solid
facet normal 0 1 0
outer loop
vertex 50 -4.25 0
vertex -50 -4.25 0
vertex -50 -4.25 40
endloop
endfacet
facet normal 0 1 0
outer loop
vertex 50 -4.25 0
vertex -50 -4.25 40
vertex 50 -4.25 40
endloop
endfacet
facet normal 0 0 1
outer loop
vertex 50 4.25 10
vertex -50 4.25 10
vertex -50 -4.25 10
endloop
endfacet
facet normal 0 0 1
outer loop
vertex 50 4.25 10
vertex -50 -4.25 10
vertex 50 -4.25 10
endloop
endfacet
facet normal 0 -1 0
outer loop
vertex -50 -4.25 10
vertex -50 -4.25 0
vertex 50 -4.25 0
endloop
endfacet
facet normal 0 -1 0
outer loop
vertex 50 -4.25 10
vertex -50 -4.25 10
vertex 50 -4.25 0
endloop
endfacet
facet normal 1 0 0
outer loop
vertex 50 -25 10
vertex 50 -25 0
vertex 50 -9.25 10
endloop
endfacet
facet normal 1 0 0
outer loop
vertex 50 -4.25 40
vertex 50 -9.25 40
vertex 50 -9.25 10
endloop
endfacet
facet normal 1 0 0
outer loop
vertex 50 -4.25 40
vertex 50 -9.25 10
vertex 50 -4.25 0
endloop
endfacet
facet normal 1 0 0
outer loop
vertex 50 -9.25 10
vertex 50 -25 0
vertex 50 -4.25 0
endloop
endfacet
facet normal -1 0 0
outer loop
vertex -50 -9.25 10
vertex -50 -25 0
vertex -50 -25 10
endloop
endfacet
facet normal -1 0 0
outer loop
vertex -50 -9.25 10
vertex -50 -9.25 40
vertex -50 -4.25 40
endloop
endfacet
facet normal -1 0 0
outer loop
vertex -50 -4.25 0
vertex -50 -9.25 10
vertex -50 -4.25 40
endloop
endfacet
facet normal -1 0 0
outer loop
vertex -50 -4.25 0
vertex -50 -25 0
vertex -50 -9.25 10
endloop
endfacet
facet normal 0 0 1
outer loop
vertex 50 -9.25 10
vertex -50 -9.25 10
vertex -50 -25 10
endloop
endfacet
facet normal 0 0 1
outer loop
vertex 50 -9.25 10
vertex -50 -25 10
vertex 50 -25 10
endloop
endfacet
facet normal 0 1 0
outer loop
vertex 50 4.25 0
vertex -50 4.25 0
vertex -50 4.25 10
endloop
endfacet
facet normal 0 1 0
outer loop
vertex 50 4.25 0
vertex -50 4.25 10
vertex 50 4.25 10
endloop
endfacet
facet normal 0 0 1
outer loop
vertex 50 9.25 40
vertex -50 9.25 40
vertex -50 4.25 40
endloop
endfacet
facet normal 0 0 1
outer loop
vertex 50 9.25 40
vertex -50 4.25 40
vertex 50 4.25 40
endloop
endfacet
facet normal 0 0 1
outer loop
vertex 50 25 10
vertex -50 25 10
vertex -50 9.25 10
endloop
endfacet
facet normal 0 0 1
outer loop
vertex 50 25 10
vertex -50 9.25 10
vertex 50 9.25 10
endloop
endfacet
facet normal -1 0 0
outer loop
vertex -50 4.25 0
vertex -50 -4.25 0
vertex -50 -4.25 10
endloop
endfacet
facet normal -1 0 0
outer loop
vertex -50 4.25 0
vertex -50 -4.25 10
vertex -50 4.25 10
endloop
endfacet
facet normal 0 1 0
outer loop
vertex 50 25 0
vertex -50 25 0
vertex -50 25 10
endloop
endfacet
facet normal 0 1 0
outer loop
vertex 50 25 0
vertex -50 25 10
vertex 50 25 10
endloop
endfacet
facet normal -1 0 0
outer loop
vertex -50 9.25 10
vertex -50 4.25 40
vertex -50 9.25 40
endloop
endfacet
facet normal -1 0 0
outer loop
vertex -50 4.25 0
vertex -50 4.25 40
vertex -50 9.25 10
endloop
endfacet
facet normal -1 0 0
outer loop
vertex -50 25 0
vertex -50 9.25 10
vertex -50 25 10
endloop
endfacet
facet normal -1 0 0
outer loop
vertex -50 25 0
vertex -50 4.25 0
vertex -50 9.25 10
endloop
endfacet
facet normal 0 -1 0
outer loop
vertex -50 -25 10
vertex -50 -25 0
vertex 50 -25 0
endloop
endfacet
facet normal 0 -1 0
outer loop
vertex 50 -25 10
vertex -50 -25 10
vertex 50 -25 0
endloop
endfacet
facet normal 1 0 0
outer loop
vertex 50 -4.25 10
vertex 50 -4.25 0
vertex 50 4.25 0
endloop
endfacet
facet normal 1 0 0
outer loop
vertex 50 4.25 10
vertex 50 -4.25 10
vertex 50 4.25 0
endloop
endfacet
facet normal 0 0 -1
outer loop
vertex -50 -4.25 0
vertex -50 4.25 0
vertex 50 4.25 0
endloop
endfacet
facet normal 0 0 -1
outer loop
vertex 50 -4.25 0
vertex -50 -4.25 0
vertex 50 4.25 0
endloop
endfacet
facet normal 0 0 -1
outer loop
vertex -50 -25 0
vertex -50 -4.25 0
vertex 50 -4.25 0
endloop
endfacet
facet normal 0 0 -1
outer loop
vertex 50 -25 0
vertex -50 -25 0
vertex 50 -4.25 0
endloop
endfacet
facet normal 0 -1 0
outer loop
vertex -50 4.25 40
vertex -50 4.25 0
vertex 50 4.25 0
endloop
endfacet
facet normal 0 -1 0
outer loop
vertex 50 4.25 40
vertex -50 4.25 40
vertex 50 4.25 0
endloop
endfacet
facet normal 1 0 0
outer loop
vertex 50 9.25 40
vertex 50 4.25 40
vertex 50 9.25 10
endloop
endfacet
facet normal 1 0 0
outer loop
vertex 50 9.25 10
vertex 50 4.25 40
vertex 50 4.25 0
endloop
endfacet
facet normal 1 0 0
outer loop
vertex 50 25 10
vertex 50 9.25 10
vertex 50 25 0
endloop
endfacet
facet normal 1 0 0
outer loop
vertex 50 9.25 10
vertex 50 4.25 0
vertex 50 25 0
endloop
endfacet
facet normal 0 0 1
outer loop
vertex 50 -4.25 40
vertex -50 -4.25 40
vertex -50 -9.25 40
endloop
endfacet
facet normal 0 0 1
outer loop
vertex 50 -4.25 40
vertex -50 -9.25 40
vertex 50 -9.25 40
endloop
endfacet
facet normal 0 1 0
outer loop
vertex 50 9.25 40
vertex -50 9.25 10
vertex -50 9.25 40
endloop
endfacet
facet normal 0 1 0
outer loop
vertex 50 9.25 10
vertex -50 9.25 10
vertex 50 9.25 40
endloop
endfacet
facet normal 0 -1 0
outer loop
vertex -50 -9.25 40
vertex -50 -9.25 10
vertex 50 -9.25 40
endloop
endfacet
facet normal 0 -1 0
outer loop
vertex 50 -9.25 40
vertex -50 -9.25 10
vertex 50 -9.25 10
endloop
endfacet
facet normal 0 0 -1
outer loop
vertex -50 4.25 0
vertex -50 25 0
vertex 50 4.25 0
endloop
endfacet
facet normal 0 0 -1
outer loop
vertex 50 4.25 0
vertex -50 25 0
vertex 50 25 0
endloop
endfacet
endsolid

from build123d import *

# Parameters (mm, degrees)
F0_W     = 100
F0_H     = 50
F1_DEPTH = 10
F2_W     = 100
F2_H     = 18.5
F3_DEPTH = 40
F4_W     = 100
F4_H     = 8.5
F5_DEPTH = 40
F6_DEPTH = 10


with BuildPart() as f1:
    # F0 (on Top) → F1 (new body)
    with BuildSketch(Plane.XY):
        Rectangle(F0_W, F0_H)
    extrude(amount=F1_DEPTH)

    # F2 (on Top) → F3 (join)
    with BuildSketch(Plane.XY):
        Rectangle(F2_W, F2_H)
    extrude(amount=F3_DEPTH)

    # F4 (on Top) → F5 (cut)
    with BuildSketch(Plane.XY):
        Rectangle(F4_W, F4_H)
    extrude(amount=F5_DEPTH, mode=Mode.SUBTRACT)


with BuildPart() as f6:
    # F4 (on Top) → F6 (new body)
    with BuildSketch(Plane.XY):
        Rectangle(F4_W, F4_H)
    extrude(amount=F6_DEPTH)


solid = Compound([f1.part, f6.part])
